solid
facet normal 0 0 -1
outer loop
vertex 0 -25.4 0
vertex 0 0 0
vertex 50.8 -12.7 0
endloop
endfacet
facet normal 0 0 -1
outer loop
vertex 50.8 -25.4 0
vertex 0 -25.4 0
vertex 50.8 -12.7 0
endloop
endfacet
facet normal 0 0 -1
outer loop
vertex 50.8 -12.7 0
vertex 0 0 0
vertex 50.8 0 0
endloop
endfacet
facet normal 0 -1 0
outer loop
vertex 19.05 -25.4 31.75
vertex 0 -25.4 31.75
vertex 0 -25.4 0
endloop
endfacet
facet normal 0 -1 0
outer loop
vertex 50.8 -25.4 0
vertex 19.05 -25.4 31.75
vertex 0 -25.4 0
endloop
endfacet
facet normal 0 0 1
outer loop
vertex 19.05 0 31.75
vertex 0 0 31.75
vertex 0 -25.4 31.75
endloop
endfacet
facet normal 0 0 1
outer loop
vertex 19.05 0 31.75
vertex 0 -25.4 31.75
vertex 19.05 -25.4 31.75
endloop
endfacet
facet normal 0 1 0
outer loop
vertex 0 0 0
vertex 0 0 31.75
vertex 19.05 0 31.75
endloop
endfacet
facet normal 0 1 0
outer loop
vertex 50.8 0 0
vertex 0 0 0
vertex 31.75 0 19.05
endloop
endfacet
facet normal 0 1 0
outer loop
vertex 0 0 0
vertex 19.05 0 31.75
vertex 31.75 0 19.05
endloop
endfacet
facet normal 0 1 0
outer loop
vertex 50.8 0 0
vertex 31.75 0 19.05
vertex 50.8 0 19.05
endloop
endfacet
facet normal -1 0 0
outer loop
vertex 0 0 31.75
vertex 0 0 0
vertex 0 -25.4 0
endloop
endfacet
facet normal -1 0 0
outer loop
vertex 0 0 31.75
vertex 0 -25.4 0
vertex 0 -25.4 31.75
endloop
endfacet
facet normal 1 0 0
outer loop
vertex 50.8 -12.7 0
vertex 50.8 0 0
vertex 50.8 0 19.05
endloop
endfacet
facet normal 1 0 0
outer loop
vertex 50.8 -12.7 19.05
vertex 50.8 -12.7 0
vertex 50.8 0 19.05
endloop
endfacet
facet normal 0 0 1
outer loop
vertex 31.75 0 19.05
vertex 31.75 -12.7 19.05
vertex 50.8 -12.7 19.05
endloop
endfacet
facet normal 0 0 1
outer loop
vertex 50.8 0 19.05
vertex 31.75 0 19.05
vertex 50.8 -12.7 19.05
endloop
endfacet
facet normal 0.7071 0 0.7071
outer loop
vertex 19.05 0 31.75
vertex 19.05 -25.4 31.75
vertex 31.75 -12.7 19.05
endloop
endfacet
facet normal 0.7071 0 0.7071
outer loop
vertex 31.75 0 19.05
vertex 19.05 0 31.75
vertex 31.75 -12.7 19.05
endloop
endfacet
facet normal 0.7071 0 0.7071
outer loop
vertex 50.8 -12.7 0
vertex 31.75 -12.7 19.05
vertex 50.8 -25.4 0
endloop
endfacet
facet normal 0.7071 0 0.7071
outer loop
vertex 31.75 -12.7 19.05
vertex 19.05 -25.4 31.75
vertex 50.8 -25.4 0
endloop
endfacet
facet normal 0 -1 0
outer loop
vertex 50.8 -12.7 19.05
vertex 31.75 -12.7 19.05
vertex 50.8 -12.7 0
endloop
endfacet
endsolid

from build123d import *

# Parameters (mm, degrees)
F0_W     = 50.8
F0_H     = 31.75
F1_DEPTH = 25.4
F3_DEPTH = 12.7
F5_DEPTH = 25.4


with BuildPart() as f1:
    # F0 (on Front) → F1 (new body)
    with BuildSketch(Plane.XZ):
        with Locations((25.4, 15.875)):
            Rectangle(F0_W, F0_H)
    extrude(amount=F1_DEPTH)

    # F2 (on face) → F3 (cut)
    with BuildSketch(Plane.XZ.offset(25.4)):
        Polygon((50.8, 31.75), (19.05, 31.75), (50.8, 0), align=None)
    extrude(amount=-F3_DEPTH, mode=Mode.SUBTRACT)

    # F4 (on face) → F5 (cut)
    with BuildSketch(Plane.XZ.offset(12.7)):
        Polygon((19.05, 31.75), (31.75, 19.05), (50.8, 19.05), (50.8, 31.75), align=None)
    extrude(amount=-F5_DEPTH, mode=Mode.SUBTRACT)


solid = f1.part
